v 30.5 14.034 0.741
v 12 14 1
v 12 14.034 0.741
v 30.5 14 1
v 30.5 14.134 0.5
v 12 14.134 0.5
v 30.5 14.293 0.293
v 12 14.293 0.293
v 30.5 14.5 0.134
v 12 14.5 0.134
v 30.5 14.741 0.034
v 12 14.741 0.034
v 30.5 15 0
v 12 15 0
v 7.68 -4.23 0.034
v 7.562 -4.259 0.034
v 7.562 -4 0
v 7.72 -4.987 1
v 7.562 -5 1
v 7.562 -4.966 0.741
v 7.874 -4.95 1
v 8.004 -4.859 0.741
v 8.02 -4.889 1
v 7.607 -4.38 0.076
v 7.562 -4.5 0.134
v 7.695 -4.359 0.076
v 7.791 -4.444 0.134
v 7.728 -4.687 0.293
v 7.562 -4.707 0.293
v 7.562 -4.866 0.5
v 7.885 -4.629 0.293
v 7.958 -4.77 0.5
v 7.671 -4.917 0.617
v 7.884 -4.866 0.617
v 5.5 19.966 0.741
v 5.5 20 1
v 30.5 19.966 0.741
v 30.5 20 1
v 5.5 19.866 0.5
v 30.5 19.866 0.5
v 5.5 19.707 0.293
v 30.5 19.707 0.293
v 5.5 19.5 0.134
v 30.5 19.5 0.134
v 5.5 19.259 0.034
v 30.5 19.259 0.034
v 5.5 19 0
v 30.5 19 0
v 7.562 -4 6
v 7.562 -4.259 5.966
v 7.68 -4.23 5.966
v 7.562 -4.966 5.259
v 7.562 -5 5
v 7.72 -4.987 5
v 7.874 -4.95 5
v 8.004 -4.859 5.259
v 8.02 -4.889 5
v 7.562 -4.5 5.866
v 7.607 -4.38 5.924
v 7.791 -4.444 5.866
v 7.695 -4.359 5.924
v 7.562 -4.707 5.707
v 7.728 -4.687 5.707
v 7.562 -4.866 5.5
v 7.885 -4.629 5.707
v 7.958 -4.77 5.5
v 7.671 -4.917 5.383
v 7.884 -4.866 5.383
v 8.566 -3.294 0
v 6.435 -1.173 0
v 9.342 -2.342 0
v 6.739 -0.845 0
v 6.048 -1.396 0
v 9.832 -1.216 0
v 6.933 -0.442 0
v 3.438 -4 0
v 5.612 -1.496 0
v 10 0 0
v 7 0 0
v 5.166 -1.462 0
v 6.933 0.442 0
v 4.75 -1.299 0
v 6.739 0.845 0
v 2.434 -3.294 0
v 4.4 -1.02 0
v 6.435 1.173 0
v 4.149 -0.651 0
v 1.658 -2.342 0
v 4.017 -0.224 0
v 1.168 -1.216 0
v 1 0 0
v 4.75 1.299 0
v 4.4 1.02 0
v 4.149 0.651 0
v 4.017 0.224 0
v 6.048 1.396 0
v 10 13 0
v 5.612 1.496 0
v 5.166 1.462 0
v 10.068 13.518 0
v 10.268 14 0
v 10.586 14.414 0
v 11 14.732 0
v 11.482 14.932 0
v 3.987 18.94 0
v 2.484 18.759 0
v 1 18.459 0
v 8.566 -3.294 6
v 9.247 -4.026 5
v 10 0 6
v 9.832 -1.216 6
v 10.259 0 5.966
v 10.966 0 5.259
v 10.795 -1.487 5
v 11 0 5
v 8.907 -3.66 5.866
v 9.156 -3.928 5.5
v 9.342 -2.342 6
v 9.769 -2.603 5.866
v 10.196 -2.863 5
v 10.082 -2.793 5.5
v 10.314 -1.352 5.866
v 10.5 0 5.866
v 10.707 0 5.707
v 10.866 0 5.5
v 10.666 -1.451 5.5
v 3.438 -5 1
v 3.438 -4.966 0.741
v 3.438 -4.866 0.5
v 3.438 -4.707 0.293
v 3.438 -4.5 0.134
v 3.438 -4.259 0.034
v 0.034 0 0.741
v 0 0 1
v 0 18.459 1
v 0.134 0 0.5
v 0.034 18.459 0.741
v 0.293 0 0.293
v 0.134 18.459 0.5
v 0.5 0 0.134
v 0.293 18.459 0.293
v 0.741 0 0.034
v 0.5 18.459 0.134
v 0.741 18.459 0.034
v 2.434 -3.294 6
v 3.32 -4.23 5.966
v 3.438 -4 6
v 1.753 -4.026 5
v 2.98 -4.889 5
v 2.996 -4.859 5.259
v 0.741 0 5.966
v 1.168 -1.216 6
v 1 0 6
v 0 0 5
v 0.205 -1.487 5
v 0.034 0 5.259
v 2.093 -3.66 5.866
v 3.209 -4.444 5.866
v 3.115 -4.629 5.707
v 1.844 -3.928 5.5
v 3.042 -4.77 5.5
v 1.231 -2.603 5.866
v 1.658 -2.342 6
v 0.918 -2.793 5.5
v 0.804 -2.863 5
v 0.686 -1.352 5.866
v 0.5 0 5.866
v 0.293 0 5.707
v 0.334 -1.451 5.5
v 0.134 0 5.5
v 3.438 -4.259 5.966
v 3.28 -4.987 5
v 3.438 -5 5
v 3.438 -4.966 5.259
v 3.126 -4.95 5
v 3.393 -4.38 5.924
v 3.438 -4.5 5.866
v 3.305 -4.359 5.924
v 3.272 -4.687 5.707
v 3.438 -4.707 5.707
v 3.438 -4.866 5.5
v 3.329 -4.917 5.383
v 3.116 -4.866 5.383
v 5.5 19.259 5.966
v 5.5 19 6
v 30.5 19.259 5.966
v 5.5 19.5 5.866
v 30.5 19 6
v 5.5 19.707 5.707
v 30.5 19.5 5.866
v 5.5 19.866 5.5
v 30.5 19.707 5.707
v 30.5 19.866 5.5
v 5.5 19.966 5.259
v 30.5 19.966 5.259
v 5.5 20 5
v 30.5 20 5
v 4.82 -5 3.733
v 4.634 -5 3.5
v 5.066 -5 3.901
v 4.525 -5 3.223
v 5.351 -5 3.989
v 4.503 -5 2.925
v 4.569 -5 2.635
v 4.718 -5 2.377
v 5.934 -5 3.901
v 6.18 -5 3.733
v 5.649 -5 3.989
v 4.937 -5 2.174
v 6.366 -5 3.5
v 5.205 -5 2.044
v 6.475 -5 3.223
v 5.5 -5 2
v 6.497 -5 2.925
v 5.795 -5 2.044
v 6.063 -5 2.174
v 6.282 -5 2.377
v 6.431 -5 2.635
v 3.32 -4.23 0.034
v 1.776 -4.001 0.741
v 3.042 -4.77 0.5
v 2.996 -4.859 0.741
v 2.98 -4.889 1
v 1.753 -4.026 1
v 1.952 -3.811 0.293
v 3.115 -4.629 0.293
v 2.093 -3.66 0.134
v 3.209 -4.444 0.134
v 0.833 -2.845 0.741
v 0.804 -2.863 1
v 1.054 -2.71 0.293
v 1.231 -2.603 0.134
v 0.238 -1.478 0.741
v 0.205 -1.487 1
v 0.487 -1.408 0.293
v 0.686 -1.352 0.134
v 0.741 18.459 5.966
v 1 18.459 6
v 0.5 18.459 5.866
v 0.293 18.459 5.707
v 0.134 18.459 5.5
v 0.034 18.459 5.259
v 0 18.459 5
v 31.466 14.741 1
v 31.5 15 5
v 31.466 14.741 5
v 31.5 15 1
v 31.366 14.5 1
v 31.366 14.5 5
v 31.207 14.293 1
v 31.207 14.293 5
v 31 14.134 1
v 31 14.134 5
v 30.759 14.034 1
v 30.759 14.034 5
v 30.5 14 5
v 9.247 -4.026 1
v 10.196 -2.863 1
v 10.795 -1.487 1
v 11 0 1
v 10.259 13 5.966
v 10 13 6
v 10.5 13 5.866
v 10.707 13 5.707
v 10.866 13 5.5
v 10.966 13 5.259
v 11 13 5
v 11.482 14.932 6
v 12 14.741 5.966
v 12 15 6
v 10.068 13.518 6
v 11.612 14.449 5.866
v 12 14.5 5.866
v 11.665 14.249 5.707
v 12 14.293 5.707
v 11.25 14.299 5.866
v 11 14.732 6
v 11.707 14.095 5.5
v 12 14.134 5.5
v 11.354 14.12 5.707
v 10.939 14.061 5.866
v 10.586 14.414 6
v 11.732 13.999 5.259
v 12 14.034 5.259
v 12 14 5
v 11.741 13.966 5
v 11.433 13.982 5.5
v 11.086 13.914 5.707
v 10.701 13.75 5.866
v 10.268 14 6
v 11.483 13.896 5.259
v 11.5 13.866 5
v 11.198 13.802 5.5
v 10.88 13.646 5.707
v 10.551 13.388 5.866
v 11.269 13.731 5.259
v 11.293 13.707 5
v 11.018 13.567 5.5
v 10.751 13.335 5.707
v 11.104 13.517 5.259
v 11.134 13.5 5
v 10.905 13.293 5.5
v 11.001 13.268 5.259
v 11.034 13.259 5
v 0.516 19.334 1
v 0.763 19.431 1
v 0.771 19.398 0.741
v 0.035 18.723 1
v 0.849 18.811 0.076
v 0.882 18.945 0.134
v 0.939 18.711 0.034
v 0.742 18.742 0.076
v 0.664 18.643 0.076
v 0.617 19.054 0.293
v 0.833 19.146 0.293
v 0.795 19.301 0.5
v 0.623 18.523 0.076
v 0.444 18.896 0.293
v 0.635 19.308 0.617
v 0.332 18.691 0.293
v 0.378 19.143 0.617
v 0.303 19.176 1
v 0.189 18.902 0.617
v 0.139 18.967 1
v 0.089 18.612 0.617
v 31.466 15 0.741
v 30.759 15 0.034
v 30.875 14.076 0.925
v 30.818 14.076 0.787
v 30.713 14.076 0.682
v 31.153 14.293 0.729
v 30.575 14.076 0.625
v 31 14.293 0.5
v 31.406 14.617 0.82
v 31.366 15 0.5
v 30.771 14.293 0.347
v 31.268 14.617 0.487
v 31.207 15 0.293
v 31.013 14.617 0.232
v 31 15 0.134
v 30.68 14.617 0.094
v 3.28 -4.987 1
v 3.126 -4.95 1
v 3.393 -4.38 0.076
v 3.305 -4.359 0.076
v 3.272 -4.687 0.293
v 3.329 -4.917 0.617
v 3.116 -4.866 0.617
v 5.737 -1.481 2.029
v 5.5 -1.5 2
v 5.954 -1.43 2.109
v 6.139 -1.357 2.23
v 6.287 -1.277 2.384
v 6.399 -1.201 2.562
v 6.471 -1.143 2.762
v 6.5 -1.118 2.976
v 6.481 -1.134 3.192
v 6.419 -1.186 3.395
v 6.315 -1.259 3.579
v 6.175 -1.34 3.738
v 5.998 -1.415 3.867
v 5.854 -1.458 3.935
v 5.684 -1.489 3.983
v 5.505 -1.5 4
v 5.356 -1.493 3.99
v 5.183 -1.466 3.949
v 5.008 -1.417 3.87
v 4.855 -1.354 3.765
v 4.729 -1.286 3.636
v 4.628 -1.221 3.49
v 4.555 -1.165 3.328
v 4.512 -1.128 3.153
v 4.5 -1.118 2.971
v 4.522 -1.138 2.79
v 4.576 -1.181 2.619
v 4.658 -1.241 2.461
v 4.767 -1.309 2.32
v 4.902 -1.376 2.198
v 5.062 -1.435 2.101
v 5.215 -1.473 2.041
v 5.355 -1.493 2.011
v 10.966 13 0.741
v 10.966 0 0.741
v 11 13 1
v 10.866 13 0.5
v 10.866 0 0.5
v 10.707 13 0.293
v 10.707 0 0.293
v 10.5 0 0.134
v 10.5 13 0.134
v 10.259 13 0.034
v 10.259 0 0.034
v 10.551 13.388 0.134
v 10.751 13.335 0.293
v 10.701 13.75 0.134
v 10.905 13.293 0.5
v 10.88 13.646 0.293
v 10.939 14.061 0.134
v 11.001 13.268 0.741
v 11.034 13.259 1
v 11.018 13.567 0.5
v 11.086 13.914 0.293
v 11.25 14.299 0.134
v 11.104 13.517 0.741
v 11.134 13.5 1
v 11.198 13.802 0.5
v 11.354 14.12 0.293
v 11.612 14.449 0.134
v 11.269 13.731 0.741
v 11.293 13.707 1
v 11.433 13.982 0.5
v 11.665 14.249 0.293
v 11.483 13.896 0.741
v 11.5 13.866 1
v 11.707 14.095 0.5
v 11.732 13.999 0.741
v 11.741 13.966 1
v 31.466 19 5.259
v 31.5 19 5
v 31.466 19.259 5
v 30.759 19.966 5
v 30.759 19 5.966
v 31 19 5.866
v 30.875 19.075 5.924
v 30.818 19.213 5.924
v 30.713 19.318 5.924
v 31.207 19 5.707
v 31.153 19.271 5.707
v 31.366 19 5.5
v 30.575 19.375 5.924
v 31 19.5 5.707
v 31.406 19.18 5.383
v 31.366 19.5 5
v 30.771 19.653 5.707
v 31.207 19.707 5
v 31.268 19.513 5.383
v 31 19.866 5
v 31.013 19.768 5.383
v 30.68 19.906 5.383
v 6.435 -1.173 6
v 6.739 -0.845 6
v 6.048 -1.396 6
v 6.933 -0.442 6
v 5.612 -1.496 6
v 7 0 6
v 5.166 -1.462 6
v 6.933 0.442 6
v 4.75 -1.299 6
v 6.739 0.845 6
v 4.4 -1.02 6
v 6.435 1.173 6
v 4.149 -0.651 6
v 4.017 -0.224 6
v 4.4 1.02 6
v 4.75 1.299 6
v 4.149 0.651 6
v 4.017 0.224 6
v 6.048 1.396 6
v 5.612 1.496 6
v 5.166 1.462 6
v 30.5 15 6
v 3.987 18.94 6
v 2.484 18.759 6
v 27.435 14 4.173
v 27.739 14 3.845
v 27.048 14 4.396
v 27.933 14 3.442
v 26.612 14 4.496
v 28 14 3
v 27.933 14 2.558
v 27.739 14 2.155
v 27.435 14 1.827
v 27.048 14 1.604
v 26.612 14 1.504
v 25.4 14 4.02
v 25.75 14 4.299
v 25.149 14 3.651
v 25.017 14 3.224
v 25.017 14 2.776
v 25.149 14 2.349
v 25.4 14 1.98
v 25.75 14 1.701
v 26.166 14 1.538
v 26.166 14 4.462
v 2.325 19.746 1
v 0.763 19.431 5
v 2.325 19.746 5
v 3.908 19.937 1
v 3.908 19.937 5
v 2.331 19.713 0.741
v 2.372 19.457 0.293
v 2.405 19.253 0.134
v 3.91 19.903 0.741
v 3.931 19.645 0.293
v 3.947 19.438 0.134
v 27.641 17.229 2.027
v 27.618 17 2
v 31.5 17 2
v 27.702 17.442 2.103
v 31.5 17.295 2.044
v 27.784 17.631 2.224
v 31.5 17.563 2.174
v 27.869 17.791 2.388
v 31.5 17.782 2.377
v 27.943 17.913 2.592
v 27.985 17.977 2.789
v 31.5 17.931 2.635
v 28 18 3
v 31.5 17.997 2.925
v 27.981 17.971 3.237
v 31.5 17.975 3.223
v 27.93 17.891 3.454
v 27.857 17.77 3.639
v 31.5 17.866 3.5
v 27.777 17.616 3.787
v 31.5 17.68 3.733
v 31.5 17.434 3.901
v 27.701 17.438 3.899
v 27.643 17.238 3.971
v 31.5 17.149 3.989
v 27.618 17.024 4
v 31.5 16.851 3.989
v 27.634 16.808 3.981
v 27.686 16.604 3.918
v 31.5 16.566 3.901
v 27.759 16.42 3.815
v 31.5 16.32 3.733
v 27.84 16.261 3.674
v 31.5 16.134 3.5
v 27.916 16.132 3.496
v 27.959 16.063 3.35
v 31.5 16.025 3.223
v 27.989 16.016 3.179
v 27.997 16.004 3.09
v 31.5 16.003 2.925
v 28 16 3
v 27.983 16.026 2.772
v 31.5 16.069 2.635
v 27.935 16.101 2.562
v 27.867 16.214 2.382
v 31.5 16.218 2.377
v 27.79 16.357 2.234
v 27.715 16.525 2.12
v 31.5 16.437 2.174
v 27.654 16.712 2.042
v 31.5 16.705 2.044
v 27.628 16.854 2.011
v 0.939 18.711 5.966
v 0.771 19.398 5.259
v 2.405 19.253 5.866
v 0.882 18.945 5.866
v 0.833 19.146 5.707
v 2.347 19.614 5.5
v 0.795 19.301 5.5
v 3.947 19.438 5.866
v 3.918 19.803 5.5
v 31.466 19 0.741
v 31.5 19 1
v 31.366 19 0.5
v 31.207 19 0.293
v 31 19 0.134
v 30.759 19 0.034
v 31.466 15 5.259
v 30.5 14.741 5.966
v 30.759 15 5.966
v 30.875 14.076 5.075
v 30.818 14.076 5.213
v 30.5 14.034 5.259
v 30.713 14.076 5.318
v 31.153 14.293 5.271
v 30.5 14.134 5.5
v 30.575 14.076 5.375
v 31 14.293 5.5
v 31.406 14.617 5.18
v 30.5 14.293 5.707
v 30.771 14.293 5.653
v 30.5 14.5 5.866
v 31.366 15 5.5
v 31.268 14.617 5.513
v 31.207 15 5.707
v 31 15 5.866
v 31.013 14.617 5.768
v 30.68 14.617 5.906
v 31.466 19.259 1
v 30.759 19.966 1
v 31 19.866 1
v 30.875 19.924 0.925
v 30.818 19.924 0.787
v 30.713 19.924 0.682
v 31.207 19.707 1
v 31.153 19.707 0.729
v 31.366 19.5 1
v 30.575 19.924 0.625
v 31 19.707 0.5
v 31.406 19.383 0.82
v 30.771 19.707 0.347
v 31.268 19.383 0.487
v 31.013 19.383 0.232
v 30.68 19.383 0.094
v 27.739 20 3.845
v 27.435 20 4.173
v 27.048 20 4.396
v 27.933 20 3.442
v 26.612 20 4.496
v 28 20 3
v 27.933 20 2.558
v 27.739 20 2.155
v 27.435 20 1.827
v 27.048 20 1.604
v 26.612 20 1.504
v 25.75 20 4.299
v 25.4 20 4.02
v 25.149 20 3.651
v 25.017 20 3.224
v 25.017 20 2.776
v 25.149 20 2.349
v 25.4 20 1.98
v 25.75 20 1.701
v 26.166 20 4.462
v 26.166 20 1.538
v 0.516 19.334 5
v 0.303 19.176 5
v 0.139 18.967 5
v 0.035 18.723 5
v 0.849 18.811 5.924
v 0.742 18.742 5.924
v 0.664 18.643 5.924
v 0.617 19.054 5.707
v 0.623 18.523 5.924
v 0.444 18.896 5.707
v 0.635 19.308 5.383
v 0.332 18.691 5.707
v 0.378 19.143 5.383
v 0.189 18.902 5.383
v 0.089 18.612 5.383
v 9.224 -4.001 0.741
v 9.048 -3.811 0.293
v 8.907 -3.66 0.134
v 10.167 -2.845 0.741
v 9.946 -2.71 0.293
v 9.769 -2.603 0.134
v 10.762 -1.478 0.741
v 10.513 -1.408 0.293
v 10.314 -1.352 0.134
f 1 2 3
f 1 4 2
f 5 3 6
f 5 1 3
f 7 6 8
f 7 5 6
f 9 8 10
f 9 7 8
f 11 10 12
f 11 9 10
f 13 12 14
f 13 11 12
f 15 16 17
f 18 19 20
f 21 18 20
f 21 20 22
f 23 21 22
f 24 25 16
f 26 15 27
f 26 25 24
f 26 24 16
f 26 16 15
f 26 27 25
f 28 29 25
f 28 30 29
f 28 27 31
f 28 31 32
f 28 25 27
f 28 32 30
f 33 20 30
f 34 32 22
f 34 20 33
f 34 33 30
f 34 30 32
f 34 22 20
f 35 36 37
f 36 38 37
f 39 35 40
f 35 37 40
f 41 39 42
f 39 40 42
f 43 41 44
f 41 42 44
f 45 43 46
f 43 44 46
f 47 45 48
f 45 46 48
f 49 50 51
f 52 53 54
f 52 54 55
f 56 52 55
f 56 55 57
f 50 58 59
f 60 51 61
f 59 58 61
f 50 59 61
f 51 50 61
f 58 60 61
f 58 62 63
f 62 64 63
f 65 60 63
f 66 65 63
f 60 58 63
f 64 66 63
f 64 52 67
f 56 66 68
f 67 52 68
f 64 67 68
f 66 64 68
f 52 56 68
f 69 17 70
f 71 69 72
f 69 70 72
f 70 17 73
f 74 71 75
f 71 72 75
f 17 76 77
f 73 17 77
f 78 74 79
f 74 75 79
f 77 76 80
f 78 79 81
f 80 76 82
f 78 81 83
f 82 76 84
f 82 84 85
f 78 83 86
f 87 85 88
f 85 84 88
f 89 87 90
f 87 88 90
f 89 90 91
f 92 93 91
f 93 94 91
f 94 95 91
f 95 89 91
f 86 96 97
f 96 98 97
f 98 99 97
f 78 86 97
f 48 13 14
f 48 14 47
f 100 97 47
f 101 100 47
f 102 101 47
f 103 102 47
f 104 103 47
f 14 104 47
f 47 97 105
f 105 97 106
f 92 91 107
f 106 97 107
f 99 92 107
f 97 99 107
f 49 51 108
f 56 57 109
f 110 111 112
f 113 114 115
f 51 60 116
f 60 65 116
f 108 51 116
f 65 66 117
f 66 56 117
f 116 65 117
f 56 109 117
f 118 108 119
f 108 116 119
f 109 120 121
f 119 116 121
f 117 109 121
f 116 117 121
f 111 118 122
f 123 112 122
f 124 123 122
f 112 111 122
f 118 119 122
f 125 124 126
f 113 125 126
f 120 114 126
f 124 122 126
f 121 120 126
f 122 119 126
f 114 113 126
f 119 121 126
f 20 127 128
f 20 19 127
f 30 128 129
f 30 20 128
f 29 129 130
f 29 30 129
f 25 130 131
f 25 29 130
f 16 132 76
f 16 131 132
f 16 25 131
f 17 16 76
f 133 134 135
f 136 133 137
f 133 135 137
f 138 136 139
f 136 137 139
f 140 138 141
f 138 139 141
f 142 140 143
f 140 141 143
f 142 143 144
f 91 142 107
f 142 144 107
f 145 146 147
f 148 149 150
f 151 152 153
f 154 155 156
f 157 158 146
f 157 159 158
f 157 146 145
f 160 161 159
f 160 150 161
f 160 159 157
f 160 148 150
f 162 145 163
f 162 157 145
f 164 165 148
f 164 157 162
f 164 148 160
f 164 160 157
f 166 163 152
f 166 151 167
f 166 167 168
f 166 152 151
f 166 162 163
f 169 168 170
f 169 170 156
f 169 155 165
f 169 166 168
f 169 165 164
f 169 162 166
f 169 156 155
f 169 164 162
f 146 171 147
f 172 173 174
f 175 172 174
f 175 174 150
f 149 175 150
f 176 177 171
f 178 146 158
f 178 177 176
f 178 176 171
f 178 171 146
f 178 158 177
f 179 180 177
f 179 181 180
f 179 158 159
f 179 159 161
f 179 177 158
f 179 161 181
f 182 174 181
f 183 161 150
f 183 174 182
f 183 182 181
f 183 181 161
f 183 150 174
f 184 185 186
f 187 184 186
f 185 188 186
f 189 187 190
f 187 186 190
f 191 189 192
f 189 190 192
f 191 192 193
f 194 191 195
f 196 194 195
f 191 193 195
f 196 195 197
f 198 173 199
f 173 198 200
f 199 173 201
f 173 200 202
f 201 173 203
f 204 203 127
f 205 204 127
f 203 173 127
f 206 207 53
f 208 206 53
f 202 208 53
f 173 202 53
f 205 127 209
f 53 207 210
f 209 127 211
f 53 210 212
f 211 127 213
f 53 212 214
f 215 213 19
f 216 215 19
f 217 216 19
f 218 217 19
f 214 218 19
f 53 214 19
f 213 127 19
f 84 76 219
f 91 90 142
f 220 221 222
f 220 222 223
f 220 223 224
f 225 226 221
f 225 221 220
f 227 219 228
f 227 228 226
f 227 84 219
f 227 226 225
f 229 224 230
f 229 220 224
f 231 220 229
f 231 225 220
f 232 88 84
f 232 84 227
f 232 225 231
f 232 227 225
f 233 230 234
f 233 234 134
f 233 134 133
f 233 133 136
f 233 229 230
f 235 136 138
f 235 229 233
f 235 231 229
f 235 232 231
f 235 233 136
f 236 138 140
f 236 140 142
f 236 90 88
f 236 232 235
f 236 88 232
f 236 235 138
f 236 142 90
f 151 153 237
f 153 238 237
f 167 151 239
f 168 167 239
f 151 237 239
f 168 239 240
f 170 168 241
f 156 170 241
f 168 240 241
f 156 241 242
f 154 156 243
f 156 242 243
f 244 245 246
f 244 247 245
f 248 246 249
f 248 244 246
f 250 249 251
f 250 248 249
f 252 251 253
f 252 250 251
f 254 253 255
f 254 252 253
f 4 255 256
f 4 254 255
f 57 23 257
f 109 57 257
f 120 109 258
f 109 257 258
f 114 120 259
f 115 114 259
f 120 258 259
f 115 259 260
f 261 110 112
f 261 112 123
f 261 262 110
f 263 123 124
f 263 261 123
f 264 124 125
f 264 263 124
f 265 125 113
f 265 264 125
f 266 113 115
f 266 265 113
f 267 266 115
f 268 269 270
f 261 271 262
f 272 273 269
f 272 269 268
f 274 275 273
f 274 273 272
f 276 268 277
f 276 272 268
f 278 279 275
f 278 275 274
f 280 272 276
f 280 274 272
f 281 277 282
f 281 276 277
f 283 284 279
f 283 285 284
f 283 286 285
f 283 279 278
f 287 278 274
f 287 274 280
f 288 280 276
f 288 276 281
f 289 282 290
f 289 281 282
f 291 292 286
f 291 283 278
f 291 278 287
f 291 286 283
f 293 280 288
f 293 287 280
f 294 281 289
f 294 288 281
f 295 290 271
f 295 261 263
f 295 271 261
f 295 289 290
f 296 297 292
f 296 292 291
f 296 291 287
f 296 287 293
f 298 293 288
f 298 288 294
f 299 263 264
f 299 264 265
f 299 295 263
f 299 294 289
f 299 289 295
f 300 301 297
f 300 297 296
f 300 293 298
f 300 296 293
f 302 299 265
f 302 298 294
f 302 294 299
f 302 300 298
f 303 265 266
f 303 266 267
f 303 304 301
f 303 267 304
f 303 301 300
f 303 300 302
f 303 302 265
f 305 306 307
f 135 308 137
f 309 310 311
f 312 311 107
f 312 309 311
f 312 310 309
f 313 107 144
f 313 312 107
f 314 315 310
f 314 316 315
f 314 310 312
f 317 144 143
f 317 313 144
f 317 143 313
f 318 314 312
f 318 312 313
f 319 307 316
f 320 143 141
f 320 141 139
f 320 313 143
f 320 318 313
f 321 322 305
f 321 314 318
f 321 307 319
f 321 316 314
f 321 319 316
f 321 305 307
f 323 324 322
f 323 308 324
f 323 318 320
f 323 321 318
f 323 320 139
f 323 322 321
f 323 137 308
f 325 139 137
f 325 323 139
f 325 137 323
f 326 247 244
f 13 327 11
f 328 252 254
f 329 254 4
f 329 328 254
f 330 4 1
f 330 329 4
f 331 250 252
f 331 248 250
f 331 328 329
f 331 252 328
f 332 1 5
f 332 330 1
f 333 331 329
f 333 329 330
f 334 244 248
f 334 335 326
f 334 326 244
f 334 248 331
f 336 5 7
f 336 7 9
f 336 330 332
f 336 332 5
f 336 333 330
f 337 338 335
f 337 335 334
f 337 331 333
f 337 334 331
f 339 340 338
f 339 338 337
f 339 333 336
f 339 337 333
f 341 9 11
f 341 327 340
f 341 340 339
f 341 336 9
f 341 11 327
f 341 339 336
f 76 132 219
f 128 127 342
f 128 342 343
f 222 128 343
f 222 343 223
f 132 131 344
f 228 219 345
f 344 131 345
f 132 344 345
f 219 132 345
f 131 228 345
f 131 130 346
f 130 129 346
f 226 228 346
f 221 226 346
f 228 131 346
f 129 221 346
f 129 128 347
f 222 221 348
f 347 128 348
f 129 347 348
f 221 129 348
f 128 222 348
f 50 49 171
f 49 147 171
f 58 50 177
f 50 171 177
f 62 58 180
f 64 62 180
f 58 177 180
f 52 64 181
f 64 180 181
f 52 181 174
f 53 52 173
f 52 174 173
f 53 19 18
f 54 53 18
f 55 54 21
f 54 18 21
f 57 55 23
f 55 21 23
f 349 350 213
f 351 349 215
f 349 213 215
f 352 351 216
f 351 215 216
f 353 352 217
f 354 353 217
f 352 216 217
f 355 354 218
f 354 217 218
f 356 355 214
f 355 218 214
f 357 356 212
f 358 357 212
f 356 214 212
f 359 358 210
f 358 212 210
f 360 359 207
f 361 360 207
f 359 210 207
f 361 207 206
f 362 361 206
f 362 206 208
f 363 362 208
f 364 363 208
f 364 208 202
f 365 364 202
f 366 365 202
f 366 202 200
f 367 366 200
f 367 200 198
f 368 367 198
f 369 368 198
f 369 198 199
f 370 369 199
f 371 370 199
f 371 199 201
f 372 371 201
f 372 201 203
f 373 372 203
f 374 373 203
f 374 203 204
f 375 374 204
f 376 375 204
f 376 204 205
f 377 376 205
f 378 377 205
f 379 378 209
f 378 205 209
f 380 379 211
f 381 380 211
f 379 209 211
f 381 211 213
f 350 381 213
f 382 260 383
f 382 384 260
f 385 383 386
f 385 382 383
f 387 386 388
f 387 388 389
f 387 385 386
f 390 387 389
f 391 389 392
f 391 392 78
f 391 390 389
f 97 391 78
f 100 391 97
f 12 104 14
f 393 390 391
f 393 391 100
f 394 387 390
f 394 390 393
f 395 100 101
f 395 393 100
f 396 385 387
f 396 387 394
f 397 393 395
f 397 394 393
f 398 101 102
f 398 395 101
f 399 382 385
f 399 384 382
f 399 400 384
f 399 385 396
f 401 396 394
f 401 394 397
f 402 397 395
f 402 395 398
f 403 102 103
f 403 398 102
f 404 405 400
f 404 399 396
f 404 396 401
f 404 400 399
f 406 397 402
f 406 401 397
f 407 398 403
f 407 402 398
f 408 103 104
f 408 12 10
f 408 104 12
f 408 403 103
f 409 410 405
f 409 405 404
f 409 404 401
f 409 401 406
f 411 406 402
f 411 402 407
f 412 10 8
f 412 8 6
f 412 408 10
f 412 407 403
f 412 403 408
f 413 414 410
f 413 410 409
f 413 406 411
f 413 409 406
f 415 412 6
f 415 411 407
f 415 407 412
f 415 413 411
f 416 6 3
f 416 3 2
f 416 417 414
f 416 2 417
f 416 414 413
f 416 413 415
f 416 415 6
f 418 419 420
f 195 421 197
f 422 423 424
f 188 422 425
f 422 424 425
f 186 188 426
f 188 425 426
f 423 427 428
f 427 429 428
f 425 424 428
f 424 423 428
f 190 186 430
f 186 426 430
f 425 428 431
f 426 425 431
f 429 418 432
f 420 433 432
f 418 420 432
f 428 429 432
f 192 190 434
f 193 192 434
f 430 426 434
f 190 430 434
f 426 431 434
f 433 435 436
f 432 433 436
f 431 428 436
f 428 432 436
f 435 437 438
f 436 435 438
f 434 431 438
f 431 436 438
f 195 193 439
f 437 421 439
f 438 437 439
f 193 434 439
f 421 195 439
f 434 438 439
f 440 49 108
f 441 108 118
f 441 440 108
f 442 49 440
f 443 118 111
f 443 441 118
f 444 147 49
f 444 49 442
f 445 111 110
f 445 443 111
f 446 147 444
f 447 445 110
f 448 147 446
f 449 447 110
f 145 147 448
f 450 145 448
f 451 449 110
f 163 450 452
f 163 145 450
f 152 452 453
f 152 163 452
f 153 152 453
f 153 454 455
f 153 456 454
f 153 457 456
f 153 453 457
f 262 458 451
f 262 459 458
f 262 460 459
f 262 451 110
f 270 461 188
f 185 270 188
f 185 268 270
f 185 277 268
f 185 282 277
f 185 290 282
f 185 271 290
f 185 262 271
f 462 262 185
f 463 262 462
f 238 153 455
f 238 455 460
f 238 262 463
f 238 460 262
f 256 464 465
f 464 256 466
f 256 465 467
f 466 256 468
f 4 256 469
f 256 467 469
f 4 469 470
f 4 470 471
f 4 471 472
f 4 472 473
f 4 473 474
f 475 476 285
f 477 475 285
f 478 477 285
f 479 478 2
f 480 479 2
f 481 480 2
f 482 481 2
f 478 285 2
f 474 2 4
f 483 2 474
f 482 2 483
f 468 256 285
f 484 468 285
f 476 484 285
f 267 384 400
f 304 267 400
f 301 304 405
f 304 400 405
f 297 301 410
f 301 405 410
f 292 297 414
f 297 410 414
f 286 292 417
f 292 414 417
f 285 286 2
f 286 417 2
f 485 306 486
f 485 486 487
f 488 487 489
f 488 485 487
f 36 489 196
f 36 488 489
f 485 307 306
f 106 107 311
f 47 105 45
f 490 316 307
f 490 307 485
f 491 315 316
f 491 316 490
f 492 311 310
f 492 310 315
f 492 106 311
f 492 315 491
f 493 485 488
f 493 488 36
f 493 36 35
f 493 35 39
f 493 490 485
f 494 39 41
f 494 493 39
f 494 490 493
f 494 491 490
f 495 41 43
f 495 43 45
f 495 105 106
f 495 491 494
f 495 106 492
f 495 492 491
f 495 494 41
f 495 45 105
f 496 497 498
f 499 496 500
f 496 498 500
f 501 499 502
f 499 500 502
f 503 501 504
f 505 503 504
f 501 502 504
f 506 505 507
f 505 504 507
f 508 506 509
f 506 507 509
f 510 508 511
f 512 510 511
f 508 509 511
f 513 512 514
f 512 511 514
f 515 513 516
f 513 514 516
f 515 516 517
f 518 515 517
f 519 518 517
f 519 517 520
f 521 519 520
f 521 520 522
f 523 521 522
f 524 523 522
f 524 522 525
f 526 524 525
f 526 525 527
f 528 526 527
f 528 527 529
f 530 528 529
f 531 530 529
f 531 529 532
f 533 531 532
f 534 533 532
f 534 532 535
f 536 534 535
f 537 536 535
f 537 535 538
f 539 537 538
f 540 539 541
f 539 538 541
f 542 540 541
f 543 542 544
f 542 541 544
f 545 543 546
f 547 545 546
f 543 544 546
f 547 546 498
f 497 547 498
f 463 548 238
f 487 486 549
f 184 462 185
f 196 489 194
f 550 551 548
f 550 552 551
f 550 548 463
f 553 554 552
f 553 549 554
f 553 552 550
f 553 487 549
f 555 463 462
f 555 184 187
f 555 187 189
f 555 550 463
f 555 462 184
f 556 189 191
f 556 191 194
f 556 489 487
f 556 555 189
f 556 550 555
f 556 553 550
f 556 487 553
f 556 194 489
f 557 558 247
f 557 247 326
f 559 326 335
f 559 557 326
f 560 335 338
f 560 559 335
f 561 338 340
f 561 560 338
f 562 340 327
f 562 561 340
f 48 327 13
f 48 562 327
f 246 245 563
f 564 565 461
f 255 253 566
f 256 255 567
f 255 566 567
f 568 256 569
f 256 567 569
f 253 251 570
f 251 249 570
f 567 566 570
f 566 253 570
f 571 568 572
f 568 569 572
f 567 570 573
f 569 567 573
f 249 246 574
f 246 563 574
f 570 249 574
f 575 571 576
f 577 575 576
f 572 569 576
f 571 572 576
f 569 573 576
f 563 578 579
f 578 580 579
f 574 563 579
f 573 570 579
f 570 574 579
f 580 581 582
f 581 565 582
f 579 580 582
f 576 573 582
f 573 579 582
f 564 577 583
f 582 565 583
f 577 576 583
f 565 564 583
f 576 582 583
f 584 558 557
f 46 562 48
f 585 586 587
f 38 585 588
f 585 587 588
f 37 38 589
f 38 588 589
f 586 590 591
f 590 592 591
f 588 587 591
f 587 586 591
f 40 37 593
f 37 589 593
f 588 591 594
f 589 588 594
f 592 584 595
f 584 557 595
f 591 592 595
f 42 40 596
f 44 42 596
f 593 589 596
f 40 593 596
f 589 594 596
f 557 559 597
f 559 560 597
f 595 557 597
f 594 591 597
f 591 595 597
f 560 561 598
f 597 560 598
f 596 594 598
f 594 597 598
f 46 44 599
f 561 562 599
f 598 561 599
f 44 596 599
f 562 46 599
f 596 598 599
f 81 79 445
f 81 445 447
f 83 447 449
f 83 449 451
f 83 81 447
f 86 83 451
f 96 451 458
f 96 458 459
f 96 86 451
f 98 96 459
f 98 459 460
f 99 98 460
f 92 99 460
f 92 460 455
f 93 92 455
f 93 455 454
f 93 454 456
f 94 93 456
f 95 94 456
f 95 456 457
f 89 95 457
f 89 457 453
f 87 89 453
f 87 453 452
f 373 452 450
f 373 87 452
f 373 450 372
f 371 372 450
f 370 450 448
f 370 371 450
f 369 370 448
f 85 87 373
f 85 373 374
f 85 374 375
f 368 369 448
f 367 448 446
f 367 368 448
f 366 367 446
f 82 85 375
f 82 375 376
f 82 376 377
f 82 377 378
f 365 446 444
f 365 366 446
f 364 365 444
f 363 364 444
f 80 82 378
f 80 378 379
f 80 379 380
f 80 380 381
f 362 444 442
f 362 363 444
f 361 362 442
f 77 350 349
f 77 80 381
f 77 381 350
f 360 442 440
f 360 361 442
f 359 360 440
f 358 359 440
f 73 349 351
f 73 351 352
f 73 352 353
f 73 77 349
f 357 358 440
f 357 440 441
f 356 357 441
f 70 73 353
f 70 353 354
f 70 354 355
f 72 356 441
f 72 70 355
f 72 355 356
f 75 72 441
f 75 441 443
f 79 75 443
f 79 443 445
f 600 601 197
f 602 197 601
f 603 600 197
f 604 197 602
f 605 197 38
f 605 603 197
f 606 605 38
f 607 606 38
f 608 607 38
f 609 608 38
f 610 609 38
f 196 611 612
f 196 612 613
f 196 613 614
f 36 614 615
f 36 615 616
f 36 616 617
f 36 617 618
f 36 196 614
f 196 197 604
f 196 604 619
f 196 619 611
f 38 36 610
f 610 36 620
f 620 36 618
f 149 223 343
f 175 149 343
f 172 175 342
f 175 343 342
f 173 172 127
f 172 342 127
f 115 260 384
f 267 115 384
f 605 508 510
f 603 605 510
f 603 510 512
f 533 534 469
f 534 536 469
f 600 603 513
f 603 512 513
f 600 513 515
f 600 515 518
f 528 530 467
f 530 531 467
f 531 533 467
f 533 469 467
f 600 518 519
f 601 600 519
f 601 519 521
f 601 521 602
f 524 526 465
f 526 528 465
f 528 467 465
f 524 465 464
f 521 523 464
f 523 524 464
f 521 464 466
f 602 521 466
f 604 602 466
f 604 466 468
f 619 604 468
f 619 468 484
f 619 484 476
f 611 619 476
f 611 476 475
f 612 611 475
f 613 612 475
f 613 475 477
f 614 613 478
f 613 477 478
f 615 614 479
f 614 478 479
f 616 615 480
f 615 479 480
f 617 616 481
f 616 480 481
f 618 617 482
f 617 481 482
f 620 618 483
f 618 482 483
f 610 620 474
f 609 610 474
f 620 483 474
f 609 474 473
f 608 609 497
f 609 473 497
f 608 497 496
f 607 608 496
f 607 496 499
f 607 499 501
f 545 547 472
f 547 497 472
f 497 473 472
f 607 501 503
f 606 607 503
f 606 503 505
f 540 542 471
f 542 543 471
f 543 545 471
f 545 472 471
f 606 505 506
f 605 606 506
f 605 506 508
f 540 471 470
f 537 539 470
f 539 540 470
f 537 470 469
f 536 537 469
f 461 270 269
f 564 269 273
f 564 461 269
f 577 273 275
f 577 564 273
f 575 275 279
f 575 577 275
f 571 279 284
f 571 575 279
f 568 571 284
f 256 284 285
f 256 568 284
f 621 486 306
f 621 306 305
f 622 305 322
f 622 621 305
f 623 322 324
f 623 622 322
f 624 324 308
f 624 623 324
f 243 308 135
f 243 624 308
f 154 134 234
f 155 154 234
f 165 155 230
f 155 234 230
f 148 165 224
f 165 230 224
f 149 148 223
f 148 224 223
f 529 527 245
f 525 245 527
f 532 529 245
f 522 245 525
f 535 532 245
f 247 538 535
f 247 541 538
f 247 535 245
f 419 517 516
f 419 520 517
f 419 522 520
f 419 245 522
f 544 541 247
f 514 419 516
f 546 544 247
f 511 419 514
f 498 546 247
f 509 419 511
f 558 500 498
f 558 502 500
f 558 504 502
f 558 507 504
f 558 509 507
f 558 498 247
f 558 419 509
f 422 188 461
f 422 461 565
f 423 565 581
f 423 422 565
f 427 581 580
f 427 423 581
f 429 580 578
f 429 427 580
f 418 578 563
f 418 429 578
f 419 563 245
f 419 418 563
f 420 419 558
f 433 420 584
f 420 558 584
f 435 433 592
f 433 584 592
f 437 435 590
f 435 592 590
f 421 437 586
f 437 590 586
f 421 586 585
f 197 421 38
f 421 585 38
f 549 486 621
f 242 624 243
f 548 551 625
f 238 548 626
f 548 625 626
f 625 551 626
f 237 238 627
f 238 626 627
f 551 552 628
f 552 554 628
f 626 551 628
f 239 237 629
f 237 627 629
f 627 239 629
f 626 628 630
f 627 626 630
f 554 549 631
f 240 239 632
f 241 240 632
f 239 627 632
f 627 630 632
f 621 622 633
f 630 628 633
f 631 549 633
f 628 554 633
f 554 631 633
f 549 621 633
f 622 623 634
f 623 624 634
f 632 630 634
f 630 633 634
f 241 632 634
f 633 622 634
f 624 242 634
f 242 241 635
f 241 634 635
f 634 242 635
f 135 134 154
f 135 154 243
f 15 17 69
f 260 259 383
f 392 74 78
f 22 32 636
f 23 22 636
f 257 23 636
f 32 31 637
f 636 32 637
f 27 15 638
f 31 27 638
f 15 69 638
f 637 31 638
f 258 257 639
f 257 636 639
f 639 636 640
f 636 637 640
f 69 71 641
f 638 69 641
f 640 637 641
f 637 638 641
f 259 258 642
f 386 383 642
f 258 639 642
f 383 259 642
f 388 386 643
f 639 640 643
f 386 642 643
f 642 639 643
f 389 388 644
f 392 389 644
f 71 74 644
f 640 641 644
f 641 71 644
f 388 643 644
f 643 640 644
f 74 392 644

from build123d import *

# Parameters (mm, degrees)
SKETCH_1_W          = 11
SKETCH_1_H          = 20
EXTRUDE_1_DEPTH     = 6
CUT_EXTRUDE_1_DEPTH = 6
SKETCH_3_R          = 5.5
EXTRUDE_2_DEPTH     = 6
SKETCH_4_W          = 24
SKETCH_4_H          = 6
EXTRUDE_3_DEPTH     = 6
SKETCH_6_R          = 1.5
CUT_EXTRUDE_3_DEPTH = 6
SKETCH_7_R          = 1.5
CUT_EXTRUDE_4_DEPTH = 6
SKETCH_5_W          = 6
SKETCH_5_H          = 0.5
CUT_EXTRUDE_5_DEPTH = 10
SKETCH_14_R         = 1
CUT_EXTRUDE_6_DEPTH = 4
SKETCH_15_W         = 6
SKETCH_15_H         = 6
EXTRUDE_4_DEPTH     = 2
SKETCH_16_R         = 1
CUT_EXTRUDE_7_DEPTH = 4
FILLET_2_R          = 1


# Read off the part's stored shape, not the designer's step: 切除-拉伸1
with BuildPart() as part:
    # 草图1 → 凸台-拉伸1 (new body)
    with BuildSketch(Plane.XY):
        with Locations((5.5, 10)):
            Rectangle(SKETCH_1_W, SKETCH_1_H)
    extrude(amount=EXTRUDE_1_DEPTH)

    # 切除-拉伸1 outline → 切除-拉伸1 (cut)
    with BuildSketch(Plane.XY):
        with BuildLine():
            Line((0, 20), (0, 19.228884523))
            ThreePointArc((0, 19.228884523), (2.723103392, 19.806282974), (5.5, 20))
            Line((5.5, 20), (0, 20))
        make_face()
        with BuildLine():
            Line((11, 20), (5.5, 20))
            ThreePointArc((5.5, 20), (8.276896608, 19.806282974), (11, 19.228884523))
            Line((11, 19.228884523), (11, 20))
        make_face()
    extrude(amount=CUT_EXTRUDE_1_DEPTH, mode=Mode.SUBTRACT)

    # 草图3 → 凸台-拉伸2 (add)
    with BuildSketch(Plane.XY):
        with Locations((5.5, 0)):
            Circle(SKETCH_3_R)
    extrude(amount=EXTRUDE_2_DEPTH)

    # 草图4 → 凸台-拉伸3 (add)
    with BuildSketch(Plane.XY):
        with Locations((17.5, 17)):
            Rectangle(SKETCH_4_W, SKETCH_4_H)
    extrude(amount=EXTRUDE_3_DEPTH)

    # 草图6 → 切除-拉伸3 (cut)
    with BuildSketch(Plane.XY):
        with Locations((5.5, 0)):
            Circle(SKETCH_6_R)
    extrude(amount=CUT_EXTRUDE_3_DEPTH, mode=Mode.SUBTRACT)

    # 草图7 → 切除-拉伸4 (cut)
    with BuildSketch(Plane.XZ.offset(-14)):
        with Locations((26.5, 3)):
            Circle(SKETCH_7_R)
    extrude(amount=-CUT_EXTRUDE_4_DEPTH, mode=Mode.SUBTRACT)

    # 草图5 → 切除-拉伸5 (cut)
    with BuildSketch(Plane.XY):
        with Locations((5.5, -5.25)):
            Rectangle(SKETCH_5_W, SKETCH_5_H)
    extrude(amount=CUT_EXTRUDE_5_DEPTH, mode=Mode.SUBTRACT)

    # 草图14 → 切除-拉伸6 (cut)
    with BuildSketch(Plane(origin=(0, -5, 0), x_dir=(-1, 0, 0), z_dir=(0, -1, 0))):
        with Locations(Location((-5.5, -3, 0), (0, 0, 90))):
            Circle(SKETCH_14_R)
    extrude(amount=-CUT_EXTRUDE_6_DEPTH, mode=Mode.SUBTRACT)

    # 草图15 → 凸台-拉伸4 (add)
    with BuildSketch(Plane(origin=(29.5, 0, 0), x_dir=(0, 0, -1), z_dir=(1, 0, 0))):
        with Locations((-3, 17)):
            Rectangle(SKETCH_15_W, SKETCH_15_H)
    extrude(amount=EXTRUDE_4_DEPTH)

    # 草图16 → 切除-拉伸7 (cut)
    with BuildSketch(Plane(origin=(31.5, 0, 0), x_dir=(0, 0, -1), z_dir=(1, 0, 0))):
        with Locations((-3, 17)):
            Circle(SKETCH_16_R)
    extrude(amount=-CUT_EXTRUDE_7_DEPTH, mode=Mode.SUBTRACT)

    # 圆角2
    fillet_2_edges = [part.edges().sort_by_distance(p)[0] for p in [
        (31.5, 17, 0),
        (31.5, 20, 3),
        (31.5, 17, 6),
        (31.5, 14, 3),
        (11, 7, 6),
        (0, 9.614442262, 0),
        (0, 9.614442262, 6),
        (0, 19.228884523, 3),
        (0.871172764, -2.970514841, 0),
        (0.871172764, -2.970514841, 6),
        (2.723103392, 19.806282974, 6),
        (2.723103392, 19.806282974, 0),
        (11, 14, 3),
        (11, 7, 0),
        (21.25, 14, 0),
        (21.25, 14, 6),
        (18.5, 20, 6),
        (18.5, 20, 0),
        (10.128827236, -2.970514841, 6),
        (10.128827236, -2.970514841, 0),
        (7.791287847, -5, 3),
        (3.208712153, -5, 3),
        (5.5, -5, 0),
        (5.5, -5, 6),
    ]]
    fillet(fillet_2_edges, radius=FILLET_2_R)


solid = part.part
